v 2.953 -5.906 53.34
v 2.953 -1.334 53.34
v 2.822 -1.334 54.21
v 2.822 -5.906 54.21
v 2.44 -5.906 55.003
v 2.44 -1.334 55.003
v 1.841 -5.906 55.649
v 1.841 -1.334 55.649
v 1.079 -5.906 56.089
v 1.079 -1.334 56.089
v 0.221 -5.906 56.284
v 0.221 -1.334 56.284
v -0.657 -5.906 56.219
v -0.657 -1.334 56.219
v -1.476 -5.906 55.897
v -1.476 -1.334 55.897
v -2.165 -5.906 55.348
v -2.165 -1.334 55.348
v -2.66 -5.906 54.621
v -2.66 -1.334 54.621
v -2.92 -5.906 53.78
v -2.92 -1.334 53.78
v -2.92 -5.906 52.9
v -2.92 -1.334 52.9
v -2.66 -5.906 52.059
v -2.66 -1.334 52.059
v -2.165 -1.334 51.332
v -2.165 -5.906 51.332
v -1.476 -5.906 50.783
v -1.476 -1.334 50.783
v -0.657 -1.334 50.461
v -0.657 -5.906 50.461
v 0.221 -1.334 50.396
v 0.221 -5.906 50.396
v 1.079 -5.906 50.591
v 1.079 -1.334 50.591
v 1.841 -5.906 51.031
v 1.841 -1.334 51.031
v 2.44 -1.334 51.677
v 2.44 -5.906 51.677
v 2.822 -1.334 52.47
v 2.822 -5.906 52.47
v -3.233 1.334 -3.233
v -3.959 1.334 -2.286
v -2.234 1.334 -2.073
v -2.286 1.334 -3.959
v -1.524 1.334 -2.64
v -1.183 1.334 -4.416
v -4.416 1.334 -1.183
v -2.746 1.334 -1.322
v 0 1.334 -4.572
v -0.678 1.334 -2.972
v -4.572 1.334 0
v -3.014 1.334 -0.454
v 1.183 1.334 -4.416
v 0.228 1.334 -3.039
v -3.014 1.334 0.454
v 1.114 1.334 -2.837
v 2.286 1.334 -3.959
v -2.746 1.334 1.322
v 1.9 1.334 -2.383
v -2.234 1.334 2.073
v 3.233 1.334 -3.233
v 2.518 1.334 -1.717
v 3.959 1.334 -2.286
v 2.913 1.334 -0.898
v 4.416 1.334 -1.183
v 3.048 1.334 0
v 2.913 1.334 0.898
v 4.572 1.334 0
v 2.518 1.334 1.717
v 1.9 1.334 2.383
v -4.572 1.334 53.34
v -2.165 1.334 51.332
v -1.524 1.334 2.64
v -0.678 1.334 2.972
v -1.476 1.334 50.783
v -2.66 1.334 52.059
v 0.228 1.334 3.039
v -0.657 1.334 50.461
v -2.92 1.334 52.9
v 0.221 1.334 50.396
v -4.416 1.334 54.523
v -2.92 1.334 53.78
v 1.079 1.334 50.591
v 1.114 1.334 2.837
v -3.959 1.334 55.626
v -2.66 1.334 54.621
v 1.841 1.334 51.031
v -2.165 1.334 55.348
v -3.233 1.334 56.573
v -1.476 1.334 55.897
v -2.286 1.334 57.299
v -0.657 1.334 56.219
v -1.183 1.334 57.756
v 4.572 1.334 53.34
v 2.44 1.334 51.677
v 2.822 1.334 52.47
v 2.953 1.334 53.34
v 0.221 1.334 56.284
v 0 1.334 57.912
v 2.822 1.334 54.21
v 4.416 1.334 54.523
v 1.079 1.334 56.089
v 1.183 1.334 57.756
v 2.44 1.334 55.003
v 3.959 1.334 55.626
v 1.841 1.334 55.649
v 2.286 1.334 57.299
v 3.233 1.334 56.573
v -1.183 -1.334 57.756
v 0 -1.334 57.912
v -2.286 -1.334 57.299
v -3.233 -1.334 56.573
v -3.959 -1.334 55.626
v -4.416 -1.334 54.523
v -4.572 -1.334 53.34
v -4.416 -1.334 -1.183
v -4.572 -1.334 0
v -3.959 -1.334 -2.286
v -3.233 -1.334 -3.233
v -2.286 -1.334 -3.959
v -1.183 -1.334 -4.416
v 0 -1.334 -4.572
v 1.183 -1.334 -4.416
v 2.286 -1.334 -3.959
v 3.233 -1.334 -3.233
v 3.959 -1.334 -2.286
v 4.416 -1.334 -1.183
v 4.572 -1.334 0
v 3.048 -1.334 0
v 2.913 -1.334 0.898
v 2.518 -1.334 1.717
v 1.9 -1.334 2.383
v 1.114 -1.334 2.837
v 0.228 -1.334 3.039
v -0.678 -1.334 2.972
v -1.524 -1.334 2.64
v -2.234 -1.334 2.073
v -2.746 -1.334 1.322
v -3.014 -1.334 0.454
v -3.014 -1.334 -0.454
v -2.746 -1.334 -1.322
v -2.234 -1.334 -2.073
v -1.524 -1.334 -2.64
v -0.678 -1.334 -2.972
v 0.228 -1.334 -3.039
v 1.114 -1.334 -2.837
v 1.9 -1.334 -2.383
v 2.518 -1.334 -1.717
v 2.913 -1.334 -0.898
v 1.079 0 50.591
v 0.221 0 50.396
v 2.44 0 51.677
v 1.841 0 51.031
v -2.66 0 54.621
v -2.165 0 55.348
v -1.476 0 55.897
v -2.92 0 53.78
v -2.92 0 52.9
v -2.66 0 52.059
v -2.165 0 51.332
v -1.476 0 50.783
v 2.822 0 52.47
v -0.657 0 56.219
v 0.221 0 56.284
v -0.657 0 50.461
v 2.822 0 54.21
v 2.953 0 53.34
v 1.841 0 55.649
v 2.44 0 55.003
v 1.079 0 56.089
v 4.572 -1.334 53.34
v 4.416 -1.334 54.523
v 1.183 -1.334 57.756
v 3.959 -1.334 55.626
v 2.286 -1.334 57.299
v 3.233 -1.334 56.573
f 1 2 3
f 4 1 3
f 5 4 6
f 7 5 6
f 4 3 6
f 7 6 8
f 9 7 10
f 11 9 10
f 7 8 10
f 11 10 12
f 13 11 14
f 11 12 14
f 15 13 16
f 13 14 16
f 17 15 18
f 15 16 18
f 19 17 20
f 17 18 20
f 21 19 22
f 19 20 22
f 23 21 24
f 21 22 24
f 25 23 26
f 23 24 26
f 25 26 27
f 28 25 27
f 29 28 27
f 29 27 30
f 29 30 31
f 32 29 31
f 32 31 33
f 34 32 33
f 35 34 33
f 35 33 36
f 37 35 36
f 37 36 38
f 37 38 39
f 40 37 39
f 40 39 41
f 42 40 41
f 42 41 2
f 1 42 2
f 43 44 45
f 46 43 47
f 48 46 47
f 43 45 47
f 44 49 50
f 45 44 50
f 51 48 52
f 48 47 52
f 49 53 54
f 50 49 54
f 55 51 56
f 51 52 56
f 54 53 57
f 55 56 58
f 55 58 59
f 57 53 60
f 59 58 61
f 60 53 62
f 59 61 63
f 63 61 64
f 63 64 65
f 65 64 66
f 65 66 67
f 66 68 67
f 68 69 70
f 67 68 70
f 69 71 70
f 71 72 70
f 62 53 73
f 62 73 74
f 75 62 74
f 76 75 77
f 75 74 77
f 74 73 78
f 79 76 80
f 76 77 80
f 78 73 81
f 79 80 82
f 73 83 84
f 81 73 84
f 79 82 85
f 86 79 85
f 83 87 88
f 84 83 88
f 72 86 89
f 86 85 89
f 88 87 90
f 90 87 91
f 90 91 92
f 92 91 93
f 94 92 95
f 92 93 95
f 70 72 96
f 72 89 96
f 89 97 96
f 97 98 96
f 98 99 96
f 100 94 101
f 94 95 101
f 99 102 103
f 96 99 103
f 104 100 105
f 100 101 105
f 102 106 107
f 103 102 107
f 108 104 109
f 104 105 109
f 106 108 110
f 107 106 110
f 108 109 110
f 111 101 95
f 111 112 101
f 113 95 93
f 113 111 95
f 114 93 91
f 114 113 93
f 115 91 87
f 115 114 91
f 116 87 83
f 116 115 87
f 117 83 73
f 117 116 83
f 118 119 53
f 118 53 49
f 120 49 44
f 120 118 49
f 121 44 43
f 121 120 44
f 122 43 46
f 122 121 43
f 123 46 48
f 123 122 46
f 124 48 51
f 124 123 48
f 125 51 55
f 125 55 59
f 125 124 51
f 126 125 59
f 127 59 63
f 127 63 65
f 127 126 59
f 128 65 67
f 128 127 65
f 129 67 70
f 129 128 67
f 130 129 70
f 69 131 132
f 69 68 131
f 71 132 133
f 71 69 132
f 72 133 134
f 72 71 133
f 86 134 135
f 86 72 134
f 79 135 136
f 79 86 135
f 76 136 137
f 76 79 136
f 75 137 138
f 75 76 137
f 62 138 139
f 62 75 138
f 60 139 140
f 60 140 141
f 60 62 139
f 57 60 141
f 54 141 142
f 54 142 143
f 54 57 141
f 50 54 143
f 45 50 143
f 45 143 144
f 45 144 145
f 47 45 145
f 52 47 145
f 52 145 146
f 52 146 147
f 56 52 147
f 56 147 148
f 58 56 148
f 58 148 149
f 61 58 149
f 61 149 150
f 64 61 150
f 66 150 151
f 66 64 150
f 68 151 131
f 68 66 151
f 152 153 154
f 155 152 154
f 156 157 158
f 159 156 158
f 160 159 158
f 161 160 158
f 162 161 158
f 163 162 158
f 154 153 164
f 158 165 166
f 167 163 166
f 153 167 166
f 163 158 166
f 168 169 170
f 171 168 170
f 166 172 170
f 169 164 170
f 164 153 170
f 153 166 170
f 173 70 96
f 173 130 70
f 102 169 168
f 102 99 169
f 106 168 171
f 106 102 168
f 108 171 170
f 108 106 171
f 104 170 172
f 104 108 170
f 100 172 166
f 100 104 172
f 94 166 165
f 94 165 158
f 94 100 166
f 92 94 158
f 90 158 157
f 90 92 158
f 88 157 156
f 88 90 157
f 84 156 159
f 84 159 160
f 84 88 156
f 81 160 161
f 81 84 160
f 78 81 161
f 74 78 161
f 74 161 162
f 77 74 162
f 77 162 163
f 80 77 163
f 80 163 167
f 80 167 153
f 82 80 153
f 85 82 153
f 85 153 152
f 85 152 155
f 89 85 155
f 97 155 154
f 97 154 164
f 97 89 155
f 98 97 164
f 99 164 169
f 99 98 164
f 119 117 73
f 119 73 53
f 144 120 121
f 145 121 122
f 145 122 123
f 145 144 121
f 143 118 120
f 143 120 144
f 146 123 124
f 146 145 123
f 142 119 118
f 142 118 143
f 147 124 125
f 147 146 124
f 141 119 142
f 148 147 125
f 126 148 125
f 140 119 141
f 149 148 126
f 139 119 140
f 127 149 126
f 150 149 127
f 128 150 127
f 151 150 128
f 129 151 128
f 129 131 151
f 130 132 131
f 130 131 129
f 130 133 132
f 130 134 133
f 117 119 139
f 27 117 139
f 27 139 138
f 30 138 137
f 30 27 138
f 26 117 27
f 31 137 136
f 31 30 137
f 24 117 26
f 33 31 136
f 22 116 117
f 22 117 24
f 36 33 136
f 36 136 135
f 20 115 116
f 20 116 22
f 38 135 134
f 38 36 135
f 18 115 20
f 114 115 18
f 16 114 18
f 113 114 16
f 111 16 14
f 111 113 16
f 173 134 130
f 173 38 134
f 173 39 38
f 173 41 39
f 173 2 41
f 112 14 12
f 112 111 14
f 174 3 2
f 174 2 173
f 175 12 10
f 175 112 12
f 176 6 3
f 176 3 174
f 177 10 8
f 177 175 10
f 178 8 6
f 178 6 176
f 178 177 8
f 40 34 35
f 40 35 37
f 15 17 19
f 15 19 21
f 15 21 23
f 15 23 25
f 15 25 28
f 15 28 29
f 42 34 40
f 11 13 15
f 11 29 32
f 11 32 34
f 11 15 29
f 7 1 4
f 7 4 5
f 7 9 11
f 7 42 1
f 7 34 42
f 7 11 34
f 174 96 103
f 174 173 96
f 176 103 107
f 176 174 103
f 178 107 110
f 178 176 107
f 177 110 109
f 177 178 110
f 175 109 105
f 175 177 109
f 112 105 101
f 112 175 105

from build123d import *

# Parameters (mm, degrees)
F0_R     = 0.4064
F0_R_2   = 0.3937
F1_DEPTH = 0.1778
F2_DEPTH = 0.7874
F3_SCALE = 7.5


with BuildPart() as f1:
    # F0 (on Front) → F1 (new body, symmetric)
    with BuildSketch(Plane.XZ):
        with BuildLine():
            ThreePointArc((0, 7.7216), (-0.4310522938, 7.5430522938), (-0.6096, 7.112))
            Line((-0.6096, 7.112), (-0.6096, 0))
            ThreePointArc((-0.6096, 0), (-0.4310522938, -0.4310522938), (0, -0.6096))
            ThreePointArc((0, -0.6096), (0.4310522938, -0.4310522938), (0.6096, 0))
            Line((0.6096, 0), (0.6096, 7.112))
            ThreePointArc((0.6096, 7.112), (0.4310522938, 7.5430522938), (0, 7.7216))
        make_face()
        Circle(F0_R, mode=Mode.SUBTRACT)
        with Locations((0, 7.112)):
            Circle(F0_R_2, mode=Mode.SUBTRACT)
    extrude(amount=F1_DEPTH, both=True)

    # F0 (on Front) → F2 (join)
    with BuildSketch(Plane.XZ):
        with Locations((0, 7.112)):
            Circle(F0_R_2)
    extrude(amount=F2_DEPTH)


with BuildPart() as f1_1:
    # F3: moved
    add(f1.part.scale(F3_SCALE))


solid = f1_1.part
